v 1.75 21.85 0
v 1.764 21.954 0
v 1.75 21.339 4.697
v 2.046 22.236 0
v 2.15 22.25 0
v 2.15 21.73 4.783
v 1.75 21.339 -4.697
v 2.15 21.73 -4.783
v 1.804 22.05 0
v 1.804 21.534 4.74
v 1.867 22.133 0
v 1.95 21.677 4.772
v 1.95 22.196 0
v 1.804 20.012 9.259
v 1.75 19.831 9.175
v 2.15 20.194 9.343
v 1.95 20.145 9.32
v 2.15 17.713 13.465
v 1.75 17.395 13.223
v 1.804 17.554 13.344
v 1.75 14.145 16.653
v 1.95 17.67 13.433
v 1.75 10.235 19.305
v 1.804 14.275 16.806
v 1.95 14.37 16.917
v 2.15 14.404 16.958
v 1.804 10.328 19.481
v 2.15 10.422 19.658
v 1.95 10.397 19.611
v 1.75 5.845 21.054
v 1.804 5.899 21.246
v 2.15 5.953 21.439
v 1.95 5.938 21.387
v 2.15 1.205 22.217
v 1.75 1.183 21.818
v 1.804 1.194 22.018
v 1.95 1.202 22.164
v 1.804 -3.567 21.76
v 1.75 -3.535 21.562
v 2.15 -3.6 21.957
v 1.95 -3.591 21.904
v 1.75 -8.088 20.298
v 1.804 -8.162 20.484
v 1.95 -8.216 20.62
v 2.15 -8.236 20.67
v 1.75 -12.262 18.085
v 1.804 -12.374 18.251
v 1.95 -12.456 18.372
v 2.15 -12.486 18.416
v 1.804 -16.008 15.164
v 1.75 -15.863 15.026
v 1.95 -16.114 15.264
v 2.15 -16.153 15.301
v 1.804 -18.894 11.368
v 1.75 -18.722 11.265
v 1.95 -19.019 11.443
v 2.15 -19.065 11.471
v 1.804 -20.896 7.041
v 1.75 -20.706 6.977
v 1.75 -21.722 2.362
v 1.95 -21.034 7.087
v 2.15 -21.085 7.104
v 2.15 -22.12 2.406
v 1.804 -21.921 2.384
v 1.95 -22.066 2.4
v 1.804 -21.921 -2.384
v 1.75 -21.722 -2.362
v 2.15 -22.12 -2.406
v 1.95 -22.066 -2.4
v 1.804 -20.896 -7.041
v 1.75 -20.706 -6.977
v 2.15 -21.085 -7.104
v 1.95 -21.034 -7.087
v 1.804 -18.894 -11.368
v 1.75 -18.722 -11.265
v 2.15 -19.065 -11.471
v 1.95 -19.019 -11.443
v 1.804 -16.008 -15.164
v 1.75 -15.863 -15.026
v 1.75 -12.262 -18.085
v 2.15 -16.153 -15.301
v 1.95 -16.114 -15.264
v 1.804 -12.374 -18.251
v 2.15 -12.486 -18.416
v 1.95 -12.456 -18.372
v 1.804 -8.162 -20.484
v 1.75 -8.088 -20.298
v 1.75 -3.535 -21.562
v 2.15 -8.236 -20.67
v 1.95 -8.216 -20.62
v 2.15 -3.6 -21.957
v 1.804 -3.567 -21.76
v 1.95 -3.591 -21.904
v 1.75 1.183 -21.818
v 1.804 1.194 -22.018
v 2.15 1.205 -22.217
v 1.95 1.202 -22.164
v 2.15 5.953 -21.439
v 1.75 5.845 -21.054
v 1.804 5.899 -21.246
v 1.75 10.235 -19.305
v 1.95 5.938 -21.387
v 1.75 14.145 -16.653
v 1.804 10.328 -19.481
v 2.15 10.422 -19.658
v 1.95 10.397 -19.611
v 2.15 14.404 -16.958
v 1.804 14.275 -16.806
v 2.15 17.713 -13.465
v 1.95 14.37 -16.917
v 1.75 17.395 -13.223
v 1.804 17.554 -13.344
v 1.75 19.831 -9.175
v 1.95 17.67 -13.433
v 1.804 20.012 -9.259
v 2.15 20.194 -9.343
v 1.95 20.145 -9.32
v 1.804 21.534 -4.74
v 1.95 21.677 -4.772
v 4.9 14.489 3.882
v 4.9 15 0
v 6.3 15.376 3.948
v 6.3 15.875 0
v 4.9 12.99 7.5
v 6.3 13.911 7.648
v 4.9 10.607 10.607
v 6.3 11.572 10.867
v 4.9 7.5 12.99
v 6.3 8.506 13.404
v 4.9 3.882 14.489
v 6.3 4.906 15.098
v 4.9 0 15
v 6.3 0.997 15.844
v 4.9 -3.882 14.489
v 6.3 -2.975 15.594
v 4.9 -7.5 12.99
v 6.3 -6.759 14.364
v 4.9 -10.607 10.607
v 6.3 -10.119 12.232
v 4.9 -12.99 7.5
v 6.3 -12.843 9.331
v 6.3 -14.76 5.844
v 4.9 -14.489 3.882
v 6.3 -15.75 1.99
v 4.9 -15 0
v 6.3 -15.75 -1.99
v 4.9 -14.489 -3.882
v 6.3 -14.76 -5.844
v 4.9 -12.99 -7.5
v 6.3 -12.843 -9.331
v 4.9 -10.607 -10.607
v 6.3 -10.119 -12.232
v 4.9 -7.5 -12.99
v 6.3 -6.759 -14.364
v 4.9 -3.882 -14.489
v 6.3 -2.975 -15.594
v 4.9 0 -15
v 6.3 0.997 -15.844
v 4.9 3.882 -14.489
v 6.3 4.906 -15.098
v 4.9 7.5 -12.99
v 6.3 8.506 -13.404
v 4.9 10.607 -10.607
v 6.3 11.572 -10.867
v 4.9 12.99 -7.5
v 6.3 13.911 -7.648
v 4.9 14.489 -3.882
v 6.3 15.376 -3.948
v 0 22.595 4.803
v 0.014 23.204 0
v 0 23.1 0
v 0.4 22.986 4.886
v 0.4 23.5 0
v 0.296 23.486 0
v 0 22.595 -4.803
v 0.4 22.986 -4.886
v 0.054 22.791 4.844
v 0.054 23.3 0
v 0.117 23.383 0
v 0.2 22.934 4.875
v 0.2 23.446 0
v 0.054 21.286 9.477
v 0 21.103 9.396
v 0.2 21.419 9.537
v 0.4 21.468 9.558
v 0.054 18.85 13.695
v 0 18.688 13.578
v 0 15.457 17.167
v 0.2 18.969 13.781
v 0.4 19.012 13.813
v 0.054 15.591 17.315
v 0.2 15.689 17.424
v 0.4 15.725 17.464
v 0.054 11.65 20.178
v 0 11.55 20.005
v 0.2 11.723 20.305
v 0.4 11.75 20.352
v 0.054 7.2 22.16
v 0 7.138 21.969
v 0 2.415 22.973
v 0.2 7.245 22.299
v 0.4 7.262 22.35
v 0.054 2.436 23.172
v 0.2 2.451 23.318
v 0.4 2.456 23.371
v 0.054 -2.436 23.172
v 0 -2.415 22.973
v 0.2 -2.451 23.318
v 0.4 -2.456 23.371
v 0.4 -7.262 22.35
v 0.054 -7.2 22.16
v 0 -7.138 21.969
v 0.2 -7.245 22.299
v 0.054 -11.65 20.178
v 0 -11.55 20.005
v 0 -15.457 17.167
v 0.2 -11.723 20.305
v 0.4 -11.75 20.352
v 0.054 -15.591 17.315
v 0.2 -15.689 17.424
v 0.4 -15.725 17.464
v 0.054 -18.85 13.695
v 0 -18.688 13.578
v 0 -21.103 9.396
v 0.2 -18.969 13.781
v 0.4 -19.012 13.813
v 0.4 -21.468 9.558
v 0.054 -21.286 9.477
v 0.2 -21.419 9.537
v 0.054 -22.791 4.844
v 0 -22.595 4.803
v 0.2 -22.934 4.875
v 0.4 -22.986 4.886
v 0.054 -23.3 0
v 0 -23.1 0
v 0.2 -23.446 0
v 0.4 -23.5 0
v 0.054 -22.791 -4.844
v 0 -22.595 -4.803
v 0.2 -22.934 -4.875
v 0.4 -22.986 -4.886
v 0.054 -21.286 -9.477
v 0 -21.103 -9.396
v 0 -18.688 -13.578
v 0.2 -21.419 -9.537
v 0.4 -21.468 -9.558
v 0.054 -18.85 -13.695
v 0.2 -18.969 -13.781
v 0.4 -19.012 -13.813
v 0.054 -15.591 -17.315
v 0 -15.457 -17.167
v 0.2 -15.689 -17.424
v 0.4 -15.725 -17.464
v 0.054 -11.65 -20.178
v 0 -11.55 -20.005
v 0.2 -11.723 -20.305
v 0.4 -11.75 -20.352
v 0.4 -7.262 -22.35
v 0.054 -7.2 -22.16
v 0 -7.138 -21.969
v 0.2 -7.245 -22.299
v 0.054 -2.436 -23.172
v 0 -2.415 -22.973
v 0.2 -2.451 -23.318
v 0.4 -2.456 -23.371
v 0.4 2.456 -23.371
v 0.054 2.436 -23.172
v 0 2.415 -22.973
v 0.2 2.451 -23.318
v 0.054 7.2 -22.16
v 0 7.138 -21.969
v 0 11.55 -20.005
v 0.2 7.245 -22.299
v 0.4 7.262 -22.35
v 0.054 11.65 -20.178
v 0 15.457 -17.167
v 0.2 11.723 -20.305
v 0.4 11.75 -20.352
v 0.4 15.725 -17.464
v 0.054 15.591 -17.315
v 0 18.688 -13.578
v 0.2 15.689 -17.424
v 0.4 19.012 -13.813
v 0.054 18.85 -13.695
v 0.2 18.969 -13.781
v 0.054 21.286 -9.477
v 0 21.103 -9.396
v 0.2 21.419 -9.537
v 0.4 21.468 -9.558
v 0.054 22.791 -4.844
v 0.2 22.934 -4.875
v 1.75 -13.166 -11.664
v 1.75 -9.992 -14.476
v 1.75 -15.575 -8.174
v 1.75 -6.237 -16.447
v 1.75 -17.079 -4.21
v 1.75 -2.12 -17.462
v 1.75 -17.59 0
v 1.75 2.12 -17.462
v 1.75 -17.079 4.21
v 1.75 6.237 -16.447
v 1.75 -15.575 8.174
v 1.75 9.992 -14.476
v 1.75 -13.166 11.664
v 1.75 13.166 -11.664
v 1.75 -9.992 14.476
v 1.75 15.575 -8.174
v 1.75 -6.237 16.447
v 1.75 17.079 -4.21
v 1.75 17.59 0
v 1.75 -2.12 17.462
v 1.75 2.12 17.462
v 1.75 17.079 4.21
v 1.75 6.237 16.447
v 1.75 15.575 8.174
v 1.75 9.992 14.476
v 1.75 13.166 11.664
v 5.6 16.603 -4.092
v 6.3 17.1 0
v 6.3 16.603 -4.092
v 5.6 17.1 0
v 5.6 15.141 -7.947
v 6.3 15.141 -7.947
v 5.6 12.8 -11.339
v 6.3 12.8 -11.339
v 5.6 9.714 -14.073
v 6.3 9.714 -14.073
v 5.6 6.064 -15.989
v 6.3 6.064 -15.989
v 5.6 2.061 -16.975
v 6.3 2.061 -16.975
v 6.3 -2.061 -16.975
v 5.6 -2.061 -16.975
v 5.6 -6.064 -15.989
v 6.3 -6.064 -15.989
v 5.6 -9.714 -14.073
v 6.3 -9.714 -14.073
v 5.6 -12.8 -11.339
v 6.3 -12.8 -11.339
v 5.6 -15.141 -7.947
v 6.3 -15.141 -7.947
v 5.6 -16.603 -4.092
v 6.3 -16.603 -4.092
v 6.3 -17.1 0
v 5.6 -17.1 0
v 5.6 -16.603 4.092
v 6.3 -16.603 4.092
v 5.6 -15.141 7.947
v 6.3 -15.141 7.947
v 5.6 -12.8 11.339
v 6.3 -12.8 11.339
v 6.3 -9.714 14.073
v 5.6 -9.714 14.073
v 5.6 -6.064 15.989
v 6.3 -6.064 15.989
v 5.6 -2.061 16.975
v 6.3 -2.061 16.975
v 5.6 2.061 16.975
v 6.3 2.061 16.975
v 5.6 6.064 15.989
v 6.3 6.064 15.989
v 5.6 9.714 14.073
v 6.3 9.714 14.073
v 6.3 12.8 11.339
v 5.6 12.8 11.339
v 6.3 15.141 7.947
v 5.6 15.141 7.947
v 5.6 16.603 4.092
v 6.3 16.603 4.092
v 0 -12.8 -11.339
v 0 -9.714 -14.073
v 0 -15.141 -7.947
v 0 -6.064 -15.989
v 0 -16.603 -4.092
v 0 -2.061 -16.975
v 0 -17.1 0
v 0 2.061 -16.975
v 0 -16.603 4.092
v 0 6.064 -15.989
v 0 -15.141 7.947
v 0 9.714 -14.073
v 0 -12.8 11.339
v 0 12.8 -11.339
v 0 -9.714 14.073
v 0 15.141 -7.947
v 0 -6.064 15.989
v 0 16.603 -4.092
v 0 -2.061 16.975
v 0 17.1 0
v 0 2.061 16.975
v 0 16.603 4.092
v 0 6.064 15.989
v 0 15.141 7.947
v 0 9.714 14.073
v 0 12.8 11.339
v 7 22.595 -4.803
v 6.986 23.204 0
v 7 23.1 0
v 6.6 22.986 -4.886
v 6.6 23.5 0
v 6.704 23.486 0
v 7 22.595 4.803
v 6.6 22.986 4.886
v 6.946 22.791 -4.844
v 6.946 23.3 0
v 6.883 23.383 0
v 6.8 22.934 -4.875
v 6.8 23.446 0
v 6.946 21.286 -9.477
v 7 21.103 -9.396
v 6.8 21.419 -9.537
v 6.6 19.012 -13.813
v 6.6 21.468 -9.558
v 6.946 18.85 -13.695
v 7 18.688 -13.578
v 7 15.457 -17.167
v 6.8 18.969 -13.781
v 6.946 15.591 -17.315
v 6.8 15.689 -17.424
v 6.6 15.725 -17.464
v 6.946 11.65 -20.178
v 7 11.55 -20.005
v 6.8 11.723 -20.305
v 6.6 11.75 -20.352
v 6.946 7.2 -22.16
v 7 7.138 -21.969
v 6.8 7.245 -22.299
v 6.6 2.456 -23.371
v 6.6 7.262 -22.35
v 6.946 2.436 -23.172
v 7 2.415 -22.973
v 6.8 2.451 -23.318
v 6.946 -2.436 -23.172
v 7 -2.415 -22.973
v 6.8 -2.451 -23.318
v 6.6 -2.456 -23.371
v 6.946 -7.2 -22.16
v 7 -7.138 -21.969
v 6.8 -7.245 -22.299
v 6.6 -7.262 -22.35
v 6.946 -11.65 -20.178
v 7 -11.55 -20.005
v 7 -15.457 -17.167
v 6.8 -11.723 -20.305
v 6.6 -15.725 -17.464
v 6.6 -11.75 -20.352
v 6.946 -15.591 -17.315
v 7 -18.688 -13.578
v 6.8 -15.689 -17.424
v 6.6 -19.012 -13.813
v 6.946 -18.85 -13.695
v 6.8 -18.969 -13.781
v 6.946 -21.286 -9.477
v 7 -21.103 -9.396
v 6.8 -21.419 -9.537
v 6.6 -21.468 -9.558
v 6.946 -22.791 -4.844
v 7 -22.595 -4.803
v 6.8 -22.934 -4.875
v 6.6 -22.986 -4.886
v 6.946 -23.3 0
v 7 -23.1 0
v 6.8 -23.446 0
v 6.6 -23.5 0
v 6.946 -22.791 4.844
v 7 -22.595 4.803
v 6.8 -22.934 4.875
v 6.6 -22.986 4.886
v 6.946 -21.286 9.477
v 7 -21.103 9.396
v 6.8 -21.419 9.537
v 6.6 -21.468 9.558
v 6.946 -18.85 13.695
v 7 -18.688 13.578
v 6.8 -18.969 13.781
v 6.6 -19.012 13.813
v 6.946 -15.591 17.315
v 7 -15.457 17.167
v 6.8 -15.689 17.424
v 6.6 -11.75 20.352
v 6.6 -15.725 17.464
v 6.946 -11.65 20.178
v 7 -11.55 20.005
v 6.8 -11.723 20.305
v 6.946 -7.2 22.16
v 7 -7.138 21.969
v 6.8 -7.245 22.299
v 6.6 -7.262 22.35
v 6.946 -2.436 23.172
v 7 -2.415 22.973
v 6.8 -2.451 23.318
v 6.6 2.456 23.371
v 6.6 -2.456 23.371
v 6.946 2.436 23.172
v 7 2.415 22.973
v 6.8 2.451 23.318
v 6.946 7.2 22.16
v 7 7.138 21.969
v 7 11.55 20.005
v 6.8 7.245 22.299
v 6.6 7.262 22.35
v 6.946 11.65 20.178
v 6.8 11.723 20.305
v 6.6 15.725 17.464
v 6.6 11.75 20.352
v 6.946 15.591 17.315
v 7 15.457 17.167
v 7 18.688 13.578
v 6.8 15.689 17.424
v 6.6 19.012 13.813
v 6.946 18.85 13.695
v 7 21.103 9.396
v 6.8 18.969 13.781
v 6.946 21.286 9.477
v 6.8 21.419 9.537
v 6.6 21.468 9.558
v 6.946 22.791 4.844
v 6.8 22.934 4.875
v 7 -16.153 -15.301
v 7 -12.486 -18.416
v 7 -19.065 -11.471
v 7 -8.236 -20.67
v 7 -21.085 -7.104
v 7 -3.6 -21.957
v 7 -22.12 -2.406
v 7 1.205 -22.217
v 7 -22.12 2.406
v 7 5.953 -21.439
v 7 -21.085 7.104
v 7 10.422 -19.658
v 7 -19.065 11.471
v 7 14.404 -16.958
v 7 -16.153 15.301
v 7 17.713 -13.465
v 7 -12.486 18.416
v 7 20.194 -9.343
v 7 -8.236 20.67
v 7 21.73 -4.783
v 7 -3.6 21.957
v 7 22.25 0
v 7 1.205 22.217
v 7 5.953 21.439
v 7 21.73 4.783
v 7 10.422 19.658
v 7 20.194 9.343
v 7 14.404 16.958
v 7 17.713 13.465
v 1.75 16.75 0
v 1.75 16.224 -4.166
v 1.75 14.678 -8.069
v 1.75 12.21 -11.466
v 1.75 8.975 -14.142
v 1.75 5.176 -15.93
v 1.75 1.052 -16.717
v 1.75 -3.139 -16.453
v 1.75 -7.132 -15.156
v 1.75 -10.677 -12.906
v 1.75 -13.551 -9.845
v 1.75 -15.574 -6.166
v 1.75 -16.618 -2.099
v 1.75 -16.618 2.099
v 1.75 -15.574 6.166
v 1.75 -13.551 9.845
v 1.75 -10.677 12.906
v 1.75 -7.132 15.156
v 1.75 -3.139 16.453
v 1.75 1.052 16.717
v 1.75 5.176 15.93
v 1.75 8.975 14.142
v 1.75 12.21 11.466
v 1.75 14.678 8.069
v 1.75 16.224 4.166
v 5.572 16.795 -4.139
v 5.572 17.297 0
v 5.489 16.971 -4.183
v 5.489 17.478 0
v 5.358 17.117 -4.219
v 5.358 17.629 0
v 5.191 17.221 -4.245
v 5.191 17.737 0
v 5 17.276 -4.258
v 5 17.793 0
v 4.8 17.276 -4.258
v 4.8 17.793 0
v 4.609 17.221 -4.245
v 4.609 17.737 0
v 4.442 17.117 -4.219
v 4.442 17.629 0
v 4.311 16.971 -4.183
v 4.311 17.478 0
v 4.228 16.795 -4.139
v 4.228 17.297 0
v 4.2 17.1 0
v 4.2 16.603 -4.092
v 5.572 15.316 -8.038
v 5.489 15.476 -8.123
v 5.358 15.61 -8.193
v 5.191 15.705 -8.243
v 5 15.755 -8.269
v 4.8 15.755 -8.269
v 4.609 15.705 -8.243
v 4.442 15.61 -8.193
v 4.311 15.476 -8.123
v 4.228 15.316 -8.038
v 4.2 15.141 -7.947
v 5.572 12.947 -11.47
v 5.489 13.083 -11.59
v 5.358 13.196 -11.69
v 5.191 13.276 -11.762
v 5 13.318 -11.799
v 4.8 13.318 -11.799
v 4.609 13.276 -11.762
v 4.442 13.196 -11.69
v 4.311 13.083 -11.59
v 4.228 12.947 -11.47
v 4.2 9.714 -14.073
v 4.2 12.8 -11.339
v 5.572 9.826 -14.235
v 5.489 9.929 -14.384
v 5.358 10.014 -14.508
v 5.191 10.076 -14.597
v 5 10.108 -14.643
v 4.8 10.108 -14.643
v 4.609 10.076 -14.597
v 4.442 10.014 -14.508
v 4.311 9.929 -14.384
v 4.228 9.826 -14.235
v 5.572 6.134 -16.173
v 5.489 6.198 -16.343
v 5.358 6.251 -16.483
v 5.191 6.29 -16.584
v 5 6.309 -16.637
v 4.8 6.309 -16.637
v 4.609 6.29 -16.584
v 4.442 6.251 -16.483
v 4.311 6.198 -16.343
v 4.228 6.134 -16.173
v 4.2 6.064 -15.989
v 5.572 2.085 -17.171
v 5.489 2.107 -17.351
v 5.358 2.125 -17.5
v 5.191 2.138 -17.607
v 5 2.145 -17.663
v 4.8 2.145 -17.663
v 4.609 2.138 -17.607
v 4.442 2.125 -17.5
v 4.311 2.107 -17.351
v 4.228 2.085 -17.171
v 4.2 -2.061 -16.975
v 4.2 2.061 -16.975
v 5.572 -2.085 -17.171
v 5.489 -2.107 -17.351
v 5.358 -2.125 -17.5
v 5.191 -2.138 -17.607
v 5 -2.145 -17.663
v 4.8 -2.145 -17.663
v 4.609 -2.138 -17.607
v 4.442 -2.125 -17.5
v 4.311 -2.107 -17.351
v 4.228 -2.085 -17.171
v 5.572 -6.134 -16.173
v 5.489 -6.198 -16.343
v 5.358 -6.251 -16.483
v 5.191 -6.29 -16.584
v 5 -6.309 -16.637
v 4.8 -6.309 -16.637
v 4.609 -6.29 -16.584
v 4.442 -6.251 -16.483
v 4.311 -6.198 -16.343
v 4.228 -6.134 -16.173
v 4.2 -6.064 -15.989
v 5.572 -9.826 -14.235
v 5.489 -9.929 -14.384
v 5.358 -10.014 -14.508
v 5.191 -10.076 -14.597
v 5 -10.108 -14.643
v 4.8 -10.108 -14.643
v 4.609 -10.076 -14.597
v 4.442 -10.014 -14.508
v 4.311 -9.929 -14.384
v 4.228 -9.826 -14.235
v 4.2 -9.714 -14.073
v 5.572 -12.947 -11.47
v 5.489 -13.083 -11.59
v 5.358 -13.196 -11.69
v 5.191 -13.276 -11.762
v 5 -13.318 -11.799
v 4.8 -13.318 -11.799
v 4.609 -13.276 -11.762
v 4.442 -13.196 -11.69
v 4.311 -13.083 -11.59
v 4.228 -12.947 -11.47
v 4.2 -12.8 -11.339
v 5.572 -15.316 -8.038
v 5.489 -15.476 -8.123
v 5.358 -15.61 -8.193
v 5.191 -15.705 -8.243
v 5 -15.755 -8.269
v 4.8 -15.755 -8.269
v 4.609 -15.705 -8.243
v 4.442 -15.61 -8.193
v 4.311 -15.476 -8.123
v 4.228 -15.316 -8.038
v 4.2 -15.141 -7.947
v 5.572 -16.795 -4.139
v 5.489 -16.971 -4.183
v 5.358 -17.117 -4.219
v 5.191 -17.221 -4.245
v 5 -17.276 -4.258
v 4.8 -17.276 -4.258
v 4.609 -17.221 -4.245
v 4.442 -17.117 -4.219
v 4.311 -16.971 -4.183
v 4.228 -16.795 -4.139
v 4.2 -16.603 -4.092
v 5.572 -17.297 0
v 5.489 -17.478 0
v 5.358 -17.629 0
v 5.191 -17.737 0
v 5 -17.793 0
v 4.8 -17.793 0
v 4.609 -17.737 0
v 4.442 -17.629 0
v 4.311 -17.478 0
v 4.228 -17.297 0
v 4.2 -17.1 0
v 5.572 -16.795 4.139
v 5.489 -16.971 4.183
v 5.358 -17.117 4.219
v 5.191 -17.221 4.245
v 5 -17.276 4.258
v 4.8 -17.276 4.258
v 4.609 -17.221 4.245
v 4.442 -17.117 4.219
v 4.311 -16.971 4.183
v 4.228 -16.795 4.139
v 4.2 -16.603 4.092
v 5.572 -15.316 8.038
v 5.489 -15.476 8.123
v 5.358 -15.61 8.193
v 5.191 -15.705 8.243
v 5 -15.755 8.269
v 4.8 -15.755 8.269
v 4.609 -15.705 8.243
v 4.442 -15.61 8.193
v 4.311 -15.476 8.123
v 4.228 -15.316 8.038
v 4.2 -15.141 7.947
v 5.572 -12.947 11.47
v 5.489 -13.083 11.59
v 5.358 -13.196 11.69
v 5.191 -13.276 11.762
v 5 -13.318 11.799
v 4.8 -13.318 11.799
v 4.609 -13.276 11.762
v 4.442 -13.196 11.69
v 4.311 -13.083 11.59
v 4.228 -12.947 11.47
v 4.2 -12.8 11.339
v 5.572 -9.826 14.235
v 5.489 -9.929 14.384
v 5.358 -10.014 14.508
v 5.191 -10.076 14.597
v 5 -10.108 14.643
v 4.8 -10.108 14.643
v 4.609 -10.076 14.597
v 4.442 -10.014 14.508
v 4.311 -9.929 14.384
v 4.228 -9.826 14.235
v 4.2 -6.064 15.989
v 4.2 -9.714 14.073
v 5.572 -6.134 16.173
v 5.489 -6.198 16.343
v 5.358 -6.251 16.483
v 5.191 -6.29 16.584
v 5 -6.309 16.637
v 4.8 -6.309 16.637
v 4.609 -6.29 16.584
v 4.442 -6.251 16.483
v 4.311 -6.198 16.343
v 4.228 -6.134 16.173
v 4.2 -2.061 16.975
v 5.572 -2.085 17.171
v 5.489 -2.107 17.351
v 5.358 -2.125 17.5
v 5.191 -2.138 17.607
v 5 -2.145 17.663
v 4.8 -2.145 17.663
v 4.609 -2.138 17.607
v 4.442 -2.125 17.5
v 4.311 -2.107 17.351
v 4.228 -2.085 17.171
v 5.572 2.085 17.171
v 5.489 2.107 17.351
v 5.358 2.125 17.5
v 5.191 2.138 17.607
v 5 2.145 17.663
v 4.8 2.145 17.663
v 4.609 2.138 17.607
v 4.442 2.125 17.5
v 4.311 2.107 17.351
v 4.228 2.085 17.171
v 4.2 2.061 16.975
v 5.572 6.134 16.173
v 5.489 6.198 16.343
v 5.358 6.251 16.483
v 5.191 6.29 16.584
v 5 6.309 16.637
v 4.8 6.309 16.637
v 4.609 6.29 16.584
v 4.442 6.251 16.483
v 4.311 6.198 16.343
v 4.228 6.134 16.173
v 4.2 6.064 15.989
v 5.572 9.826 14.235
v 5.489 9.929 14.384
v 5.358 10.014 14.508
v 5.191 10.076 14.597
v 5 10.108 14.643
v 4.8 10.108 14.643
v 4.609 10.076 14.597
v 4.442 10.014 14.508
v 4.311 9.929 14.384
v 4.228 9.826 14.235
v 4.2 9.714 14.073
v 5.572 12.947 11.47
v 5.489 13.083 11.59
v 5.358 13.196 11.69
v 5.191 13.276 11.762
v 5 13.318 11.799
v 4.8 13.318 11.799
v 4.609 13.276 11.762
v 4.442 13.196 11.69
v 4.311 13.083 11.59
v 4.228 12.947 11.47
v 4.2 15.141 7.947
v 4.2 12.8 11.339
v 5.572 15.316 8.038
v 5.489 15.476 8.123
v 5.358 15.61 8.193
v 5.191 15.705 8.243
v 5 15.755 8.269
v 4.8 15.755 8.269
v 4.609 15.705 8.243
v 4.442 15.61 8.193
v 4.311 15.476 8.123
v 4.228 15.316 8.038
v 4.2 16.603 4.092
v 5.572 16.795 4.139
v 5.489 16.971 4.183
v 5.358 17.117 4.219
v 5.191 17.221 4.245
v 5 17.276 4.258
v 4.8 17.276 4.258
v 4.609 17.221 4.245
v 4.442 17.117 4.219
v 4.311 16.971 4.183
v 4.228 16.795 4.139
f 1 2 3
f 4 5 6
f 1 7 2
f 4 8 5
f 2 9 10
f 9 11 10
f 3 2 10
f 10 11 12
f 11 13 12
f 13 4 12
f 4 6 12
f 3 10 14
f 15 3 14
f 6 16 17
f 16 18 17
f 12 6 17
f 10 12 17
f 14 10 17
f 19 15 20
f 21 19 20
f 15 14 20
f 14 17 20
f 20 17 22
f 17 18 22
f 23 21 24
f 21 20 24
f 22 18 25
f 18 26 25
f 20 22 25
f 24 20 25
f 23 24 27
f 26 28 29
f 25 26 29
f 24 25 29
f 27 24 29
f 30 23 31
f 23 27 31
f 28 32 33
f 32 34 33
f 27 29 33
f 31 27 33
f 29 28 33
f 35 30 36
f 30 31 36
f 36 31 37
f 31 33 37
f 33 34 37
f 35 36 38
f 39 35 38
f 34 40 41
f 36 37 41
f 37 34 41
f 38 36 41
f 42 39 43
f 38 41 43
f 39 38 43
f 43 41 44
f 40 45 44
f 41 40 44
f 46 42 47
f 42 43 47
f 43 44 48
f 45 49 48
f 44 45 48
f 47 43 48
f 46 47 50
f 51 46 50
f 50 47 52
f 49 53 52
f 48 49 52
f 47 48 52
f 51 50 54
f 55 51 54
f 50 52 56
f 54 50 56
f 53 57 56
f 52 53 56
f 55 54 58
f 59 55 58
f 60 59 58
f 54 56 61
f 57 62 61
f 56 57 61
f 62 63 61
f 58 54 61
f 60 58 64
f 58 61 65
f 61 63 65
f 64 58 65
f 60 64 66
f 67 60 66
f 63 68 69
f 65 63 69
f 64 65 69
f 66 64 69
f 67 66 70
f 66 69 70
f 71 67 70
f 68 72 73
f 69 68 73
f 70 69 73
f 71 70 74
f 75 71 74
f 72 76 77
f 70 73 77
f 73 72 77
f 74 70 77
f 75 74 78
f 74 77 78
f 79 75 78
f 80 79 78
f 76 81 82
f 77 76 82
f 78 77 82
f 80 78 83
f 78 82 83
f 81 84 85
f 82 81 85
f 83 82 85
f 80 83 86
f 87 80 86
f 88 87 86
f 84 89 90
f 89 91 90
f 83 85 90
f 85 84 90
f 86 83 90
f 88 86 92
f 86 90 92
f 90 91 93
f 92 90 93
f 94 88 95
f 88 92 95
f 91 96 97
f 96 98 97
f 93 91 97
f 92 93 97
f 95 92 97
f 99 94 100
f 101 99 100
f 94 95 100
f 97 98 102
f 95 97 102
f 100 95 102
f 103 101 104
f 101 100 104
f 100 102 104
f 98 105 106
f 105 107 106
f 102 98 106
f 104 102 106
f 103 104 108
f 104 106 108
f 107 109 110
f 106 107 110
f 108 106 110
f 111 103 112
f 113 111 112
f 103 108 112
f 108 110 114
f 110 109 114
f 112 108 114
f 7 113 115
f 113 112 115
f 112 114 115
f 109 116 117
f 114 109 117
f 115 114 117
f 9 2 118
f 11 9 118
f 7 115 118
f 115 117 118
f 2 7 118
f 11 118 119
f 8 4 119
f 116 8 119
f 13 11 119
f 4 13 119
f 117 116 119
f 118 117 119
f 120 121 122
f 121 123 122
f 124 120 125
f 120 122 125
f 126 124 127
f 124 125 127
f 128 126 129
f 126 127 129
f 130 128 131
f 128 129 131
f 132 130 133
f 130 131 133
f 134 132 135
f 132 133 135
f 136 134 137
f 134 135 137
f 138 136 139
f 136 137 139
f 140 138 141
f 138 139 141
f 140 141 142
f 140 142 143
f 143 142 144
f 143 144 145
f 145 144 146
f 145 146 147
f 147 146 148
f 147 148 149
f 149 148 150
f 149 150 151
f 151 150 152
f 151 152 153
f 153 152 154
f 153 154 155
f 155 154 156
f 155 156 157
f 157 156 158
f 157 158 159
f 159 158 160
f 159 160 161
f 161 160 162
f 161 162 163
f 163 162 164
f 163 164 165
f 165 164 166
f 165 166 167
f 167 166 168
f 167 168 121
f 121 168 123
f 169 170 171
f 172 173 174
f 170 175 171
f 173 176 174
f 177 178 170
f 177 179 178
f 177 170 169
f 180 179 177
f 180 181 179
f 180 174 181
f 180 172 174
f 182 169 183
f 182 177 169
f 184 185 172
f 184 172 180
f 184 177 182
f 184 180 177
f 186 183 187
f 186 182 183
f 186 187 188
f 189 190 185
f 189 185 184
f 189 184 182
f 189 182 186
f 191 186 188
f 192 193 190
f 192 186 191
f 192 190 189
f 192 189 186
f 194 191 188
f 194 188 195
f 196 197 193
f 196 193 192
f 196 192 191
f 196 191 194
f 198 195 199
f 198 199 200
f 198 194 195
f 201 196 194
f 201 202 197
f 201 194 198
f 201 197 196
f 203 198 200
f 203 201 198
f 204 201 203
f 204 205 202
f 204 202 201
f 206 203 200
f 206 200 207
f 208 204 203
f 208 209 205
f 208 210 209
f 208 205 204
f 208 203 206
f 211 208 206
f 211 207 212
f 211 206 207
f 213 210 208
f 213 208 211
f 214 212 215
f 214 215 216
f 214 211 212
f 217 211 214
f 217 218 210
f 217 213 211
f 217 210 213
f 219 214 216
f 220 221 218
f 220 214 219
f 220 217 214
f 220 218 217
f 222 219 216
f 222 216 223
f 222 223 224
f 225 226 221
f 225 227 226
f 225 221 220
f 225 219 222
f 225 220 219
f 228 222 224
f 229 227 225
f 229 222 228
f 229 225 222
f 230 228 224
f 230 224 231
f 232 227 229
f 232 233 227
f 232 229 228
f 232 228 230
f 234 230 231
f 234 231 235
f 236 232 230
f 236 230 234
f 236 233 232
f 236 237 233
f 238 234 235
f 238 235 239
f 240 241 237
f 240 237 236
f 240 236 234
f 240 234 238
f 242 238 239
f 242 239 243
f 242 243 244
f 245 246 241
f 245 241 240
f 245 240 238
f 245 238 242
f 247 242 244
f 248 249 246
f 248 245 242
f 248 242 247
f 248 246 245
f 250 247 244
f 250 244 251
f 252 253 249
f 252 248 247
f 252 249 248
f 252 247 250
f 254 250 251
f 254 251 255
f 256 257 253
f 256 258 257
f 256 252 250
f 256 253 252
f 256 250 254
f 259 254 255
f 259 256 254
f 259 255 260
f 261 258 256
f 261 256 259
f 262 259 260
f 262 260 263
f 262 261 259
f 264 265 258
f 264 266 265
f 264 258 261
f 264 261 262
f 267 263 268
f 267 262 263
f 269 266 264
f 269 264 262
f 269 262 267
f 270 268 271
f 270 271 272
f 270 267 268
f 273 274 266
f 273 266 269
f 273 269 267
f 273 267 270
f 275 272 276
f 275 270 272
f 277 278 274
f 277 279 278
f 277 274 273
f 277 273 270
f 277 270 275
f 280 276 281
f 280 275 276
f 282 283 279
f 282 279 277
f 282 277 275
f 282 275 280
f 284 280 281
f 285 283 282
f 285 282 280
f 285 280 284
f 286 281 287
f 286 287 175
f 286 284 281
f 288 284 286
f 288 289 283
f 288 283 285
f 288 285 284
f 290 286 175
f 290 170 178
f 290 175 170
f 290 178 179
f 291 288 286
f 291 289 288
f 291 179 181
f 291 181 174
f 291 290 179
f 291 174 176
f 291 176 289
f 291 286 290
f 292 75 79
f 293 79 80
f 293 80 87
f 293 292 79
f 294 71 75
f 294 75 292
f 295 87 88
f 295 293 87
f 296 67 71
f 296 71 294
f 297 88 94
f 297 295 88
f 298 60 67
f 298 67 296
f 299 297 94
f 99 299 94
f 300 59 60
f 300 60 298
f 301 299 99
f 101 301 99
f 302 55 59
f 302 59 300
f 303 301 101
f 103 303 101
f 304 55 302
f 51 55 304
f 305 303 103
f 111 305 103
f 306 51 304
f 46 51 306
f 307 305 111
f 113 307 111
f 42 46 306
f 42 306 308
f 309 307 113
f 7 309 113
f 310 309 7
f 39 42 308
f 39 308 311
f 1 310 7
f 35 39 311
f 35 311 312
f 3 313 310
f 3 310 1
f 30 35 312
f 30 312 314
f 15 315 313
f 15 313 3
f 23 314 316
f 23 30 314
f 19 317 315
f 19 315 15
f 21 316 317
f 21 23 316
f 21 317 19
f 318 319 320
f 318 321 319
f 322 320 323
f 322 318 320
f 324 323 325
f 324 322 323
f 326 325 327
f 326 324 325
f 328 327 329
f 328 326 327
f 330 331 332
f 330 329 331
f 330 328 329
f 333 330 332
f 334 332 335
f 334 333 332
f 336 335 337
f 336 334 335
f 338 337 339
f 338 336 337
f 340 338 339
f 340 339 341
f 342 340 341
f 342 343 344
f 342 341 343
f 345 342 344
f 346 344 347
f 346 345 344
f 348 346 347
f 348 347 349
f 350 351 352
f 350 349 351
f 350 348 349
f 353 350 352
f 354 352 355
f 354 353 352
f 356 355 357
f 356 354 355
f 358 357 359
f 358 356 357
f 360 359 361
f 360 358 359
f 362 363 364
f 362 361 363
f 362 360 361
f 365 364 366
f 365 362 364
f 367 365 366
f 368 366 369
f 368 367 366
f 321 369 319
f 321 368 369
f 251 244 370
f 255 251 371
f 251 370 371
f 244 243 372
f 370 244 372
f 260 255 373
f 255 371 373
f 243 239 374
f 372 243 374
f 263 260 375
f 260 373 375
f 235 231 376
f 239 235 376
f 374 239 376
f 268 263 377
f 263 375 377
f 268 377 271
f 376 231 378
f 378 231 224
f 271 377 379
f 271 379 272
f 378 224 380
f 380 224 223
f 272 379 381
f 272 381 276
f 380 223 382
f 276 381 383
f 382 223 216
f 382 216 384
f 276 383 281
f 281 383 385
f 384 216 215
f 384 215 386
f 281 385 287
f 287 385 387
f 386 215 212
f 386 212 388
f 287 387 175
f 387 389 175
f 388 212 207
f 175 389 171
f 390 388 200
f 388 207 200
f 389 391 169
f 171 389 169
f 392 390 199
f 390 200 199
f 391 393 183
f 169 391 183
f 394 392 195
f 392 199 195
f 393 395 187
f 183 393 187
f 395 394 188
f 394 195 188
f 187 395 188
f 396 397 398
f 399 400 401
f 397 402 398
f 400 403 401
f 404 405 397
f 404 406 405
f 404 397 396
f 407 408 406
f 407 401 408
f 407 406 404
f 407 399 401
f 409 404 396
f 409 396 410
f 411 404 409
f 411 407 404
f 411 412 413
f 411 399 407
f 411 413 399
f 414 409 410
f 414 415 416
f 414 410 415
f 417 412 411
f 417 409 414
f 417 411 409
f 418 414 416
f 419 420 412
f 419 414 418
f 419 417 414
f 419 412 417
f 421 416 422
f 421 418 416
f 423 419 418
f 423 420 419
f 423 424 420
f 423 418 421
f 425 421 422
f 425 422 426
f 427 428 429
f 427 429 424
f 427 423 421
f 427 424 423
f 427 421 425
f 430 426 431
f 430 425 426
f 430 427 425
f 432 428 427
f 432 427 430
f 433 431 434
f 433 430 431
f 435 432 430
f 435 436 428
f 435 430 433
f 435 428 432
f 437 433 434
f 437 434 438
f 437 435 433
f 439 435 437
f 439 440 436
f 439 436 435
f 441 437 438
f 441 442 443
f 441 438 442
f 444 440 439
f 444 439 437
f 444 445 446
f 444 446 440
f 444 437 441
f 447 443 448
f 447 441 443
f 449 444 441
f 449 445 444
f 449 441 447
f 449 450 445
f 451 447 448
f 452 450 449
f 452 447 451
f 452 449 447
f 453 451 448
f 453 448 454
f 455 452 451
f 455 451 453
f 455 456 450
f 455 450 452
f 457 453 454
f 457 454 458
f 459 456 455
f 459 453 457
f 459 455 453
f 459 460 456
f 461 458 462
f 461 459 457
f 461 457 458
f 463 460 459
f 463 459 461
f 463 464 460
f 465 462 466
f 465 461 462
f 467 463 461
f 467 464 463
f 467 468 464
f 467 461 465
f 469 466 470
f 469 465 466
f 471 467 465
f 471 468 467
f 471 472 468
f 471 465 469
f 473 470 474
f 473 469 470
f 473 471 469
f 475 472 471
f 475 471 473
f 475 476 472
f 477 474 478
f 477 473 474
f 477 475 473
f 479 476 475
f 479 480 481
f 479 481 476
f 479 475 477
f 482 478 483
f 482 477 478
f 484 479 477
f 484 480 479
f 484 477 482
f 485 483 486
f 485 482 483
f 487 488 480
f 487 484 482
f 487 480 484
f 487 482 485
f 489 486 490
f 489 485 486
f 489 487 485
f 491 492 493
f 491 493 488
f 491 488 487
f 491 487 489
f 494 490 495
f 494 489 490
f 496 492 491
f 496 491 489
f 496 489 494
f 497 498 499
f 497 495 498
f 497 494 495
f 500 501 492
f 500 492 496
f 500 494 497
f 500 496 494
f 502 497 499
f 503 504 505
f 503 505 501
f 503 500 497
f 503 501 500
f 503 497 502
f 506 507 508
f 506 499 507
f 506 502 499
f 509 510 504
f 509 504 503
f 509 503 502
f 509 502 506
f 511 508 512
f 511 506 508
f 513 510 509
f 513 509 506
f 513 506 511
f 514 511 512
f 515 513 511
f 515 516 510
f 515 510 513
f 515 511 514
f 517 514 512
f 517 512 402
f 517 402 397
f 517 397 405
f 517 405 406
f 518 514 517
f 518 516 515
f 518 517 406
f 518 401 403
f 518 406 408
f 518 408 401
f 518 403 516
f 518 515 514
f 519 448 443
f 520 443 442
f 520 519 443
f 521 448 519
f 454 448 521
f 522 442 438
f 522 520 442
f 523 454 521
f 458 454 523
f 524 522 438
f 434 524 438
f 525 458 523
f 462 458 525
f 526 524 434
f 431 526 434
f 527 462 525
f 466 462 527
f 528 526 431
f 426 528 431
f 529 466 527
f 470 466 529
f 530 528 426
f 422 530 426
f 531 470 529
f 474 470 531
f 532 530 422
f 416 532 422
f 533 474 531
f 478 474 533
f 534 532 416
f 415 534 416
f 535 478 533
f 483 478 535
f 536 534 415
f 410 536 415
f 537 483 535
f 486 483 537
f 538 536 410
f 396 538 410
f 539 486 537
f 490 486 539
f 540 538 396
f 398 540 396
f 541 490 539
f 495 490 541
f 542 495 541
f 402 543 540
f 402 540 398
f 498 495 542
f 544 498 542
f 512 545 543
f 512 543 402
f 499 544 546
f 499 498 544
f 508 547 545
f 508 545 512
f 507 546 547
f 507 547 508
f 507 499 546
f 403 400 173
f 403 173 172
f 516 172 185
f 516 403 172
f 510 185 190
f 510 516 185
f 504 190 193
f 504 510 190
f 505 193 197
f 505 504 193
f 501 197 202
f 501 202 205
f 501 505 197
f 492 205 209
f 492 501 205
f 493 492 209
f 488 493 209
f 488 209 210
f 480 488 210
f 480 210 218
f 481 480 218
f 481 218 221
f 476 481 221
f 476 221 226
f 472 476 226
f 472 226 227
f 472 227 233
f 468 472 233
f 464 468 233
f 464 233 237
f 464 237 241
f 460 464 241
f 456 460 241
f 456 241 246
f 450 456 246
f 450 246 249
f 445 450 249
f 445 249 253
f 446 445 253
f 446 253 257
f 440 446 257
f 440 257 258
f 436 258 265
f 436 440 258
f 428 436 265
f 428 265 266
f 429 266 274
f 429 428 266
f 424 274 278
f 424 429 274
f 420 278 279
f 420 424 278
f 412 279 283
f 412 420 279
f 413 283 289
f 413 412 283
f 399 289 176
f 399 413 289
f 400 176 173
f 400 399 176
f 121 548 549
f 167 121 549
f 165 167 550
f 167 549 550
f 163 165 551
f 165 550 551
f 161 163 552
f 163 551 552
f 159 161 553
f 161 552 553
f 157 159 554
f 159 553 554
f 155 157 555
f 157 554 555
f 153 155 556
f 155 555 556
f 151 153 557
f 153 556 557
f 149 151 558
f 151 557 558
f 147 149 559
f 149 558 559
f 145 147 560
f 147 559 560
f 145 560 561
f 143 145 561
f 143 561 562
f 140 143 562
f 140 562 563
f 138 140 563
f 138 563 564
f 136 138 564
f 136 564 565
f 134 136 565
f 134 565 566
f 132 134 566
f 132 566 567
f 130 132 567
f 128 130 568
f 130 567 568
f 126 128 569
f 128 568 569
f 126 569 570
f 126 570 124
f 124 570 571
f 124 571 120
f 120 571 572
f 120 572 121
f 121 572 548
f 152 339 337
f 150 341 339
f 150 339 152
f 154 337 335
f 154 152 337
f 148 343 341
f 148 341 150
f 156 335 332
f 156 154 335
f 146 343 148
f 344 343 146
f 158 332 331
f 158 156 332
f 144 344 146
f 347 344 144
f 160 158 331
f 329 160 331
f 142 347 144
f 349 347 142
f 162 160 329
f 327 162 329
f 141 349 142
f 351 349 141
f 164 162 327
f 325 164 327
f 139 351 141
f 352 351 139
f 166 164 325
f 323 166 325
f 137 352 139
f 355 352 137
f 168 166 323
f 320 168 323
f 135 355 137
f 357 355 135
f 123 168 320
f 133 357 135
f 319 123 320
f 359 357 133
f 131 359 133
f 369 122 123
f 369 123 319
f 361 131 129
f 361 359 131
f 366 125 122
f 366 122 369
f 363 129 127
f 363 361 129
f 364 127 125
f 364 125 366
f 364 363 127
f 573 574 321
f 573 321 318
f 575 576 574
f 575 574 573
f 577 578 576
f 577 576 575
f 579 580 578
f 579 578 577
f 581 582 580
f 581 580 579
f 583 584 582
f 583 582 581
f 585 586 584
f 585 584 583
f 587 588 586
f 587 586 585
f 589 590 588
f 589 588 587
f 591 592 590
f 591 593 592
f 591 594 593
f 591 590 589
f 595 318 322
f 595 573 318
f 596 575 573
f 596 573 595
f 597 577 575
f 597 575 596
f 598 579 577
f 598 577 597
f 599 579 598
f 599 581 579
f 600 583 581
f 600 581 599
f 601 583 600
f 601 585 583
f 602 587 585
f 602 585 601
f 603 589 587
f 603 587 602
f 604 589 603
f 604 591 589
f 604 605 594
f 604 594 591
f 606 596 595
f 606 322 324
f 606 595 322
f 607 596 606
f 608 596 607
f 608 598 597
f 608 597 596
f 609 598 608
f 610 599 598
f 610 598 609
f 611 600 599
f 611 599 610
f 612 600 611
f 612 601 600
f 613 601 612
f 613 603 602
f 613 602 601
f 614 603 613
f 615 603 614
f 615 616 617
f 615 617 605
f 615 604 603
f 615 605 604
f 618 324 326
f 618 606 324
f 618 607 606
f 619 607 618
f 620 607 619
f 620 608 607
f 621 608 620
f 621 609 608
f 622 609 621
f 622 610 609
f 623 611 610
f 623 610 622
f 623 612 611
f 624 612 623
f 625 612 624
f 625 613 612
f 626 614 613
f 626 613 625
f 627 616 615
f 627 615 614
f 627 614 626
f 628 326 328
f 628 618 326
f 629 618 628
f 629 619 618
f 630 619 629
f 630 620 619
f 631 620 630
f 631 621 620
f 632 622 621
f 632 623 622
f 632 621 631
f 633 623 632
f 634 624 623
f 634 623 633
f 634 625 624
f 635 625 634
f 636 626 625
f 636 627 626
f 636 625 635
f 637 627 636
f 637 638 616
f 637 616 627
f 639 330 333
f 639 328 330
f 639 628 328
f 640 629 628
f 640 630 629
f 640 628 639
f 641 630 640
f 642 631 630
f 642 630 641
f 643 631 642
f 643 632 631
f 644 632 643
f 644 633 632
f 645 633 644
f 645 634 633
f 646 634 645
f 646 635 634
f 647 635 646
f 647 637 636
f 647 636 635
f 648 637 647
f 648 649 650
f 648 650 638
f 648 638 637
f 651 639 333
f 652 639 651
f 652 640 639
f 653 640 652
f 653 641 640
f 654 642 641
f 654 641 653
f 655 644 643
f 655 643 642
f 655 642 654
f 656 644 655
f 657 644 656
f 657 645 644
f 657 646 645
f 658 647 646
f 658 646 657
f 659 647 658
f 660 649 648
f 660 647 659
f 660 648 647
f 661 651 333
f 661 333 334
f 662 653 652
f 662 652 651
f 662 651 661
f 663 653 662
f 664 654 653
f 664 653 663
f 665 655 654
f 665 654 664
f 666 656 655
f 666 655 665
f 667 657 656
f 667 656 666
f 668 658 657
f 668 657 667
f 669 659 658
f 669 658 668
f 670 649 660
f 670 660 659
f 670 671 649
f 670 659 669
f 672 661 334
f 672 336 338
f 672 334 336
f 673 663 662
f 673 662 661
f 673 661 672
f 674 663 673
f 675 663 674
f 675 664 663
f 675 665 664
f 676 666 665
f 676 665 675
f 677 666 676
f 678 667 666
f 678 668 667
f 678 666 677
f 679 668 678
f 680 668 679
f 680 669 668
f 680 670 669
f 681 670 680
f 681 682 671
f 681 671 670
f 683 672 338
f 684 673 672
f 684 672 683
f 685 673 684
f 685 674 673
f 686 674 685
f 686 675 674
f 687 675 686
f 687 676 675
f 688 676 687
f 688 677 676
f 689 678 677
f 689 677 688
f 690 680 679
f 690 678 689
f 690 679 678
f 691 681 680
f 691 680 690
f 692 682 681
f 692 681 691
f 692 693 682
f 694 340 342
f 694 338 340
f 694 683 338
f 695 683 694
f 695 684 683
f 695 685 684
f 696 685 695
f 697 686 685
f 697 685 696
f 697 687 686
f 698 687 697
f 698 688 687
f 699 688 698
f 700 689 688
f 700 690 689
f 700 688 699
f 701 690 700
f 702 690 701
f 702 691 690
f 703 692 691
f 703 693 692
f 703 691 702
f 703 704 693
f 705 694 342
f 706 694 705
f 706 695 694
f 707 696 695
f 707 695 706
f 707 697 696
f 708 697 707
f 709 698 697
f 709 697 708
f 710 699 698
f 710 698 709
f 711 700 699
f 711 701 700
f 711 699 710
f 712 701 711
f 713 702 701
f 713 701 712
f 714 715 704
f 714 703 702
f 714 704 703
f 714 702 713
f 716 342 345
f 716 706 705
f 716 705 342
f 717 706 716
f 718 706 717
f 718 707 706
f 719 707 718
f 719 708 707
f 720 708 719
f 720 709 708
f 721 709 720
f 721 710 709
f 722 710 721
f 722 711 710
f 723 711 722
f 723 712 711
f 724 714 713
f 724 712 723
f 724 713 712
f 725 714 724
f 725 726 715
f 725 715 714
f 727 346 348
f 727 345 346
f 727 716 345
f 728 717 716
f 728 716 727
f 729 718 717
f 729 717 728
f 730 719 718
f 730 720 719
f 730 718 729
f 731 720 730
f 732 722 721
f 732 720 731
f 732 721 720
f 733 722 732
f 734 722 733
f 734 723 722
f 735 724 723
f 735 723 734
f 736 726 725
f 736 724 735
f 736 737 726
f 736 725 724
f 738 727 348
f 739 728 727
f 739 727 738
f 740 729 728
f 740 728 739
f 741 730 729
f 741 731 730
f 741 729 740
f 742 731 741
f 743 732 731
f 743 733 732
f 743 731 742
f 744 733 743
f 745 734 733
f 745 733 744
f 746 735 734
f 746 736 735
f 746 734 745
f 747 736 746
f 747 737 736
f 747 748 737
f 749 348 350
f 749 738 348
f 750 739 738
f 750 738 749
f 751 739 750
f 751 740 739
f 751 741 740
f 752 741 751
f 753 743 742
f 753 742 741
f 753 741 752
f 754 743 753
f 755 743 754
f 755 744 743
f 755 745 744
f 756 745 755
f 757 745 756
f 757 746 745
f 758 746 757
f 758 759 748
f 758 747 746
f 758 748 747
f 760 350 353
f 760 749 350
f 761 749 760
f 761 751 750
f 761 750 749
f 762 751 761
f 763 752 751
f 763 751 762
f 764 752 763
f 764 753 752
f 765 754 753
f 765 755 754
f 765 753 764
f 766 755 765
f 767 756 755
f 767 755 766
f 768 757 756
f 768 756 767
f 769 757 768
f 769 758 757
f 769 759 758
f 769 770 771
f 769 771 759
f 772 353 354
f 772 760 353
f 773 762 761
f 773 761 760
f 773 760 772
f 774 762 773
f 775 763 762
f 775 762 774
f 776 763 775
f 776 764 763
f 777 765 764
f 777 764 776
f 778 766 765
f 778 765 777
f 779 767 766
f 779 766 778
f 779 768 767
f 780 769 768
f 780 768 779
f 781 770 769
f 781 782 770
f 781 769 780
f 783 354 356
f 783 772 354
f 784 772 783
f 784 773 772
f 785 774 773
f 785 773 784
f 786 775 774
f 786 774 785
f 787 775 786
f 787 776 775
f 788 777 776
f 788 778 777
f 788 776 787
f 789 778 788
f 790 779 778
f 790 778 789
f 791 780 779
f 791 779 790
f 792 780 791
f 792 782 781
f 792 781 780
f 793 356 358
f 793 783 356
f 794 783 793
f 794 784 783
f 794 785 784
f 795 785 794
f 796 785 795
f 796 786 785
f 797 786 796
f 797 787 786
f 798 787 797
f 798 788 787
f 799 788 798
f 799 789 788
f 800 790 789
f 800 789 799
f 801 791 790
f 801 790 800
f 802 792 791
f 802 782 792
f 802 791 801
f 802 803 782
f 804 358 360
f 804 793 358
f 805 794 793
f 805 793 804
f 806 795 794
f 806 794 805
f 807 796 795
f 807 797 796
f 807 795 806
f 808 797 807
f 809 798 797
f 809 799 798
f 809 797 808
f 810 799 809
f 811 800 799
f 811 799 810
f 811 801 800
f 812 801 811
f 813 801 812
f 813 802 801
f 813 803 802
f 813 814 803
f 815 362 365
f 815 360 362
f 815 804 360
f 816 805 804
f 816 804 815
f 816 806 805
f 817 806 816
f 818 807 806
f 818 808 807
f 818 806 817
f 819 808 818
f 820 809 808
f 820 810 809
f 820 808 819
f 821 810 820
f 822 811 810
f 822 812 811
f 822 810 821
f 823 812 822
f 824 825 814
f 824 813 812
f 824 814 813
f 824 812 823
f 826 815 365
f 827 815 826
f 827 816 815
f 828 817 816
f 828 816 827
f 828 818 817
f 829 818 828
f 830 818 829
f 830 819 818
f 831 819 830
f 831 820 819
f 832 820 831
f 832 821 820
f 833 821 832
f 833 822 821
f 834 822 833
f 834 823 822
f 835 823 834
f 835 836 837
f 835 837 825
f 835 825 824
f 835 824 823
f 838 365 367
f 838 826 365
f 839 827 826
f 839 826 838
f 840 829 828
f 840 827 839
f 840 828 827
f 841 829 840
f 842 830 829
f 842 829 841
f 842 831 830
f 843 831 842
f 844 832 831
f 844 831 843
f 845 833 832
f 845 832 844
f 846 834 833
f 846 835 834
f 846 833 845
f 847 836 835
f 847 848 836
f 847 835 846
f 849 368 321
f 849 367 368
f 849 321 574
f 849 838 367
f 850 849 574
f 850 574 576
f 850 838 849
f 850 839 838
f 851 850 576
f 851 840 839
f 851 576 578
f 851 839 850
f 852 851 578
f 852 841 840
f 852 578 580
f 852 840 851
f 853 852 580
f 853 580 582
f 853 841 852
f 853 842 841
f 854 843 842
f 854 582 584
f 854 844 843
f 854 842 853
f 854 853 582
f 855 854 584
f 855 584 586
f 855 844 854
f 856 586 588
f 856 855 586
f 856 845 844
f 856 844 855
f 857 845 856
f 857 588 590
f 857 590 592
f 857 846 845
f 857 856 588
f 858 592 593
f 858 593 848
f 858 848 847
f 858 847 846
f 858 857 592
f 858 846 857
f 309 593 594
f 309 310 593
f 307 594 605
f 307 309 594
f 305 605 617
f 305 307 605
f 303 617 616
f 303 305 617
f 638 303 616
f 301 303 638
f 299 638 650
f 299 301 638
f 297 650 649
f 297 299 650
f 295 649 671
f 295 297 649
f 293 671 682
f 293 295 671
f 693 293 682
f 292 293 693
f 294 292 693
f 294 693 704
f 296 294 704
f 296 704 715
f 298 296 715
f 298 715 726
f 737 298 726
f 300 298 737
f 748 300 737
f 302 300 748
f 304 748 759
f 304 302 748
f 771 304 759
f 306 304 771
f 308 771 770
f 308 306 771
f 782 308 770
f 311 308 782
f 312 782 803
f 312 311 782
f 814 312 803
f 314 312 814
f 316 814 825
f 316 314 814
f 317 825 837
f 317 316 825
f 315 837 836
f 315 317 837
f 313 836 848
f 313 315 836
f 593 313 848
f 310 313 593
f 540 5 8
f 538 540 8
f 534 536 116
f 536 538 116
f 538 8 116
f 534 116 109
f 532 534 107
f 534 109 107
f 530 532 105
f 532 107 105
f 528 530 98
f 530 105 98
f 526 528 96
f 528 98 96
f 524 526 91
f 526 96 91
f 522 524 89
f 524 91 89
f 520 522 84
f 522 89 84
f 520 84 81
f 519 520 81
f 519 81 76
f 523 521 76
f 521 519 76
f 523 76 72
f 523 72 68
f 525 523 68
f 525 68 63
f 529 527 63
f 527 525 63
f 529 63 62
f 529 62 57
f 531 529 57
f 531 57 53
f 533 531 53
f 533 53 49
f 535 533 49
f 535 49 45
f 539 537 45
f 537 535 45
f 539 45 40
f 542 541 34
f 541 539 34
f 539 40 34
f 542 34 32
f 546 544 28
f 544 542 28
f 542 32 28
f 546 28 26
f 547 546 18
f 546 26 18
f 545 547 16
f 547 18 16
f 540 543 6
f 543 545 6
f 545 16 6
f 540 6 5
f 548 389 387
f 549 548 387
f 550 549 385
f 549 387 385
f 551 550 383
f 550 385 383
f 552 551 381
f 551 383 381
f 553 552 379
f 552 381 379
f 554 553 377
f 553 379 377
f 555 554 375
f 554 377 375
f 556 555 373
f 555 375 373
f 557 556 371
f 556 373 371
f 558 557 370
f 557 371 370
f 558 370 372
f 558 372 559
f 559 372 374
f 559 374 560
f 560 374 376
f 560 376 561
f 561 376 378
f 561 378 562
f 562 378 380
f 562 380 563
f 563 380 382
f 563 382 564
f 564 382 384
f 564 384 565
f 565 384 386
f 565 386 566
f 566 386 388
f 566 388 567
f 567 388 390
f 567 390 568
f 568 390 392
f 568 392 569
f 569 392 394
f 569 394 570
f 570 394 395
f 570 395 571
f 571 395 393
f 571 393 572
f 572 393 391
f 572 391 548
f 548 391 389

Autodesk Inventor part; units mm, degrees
ref_plane "YZ Plane" through (0, 0, 0) normal (1, 0, 0) x (0, 1, 0)
ref_plane "XZ Plane" through (0, 0, 0) normal (0, 1, 0) x (-1, 0, 0)
ref_plane "XY Plane" through (0, 0, 0) normal (0, 0, 1) x (1, 0, 0)
sketch "Эскиз1" plane through (0, 0, 0) normal (0, 0, 1) x (1, 0, 0)
  circle A0 centre (4.9, 17.1) radius 0.455
  circle A1 centre (4.9, 17.1) radius 0.7
  line L0 (6.3, 15.875) -> (6.3, 17.1)
  line L1 (0, 23.5) -> (7, 23.5)
  line L2 (7, 23.5) -> (7, 22.25)
  line L3 (7, 22.25) -> (1.75, 22.25)
  line L4 (0, 0) -> (9.5856, 0)
  line L5 (0, 23.5) -> (0, 17.1)
  line L6 (0, 17.1) -> (1.75, 16.75)
  line L7 (1.75, 16.75) -> (4.9, 15)
  line L8 (4.9, 15) -> (6.3, 15.875)
  line L9 (4.9, 15) -> (0, 15) construction
  line L10 (0, 18) -> (0, -3) projected
  line L11 (-1.9171, 0) -> (11.5027, 0) projected
  line L12 (4.2, 17.1) -> (1.75, 17.59)
  line L13 (1.75, 17.59) -> (1.75, 22.25)
  line L14 (6.3, 17.1) -> (5.6, 17.1)
  dimension "d0" = 47
  dimension "d1" = 31.75
  dimension "d2" = 1.25
  dimension "d3" = 0.91
  dimension "d4" = 1.4
  dimension "d5" = 30
  dimension "d6" = 33.5
  dimension "d7" = 34.2
  dimension "d8" = 4.9
  dimension "d9" = 6.3
  dimension "d10" = 7
  dimension "d12" = 1.75
revolve "Базовый элемент" add sketch "Эскиз1" angle 360 about axis through (0, 0, 0) along (1, 0, 0) contours L14 L0 L8 L7 L6 L5 L1 L2 L3 L13 L12 A1
revolve "Пружинные1" add sketch "Эскиз1" angle 360 about axis through (0, 0, 0) along (1, 0, 0) contours A0 | A1
fillet "Сопряжение1" radius 0.4 3 edges at (7, -23.5, 0) (1.75, -22.25, 0) (0, -23.5, 0)
equation "\"d0\" = SD2"
equation "\"d1\" = ABDM"
equation "\"d3\" = SPDI"
equation "\"d4\" = SPDA"
equation "\"d5\" = NND"
equation "\"d6\" = TKDM"
equation "\"d7\" = HLDM"
equation "\"d8\" = SPDST"
equation "\"d9\" = SDI"
equation "\"d10\" = SWDT"
equation "\"d12\" = SD"
equation "\"d11\" = RR"
equation "\"SD2\" = 47"
equation "\"SWDT\" = 7"
equation "\"RR\" = 0.4"
equation "\"SD\" = 1.75"
equation "\"NND\" = 30"
equation "\"SPDA\" = 1.4"
equation "\"SPDI\" = 0.91"
equation "\"TKDM\" = 33.5"
equation "\"HLDM\" = 34.2"
equation "\"ABDM\" = 31.75"
equation "\"SDI\" = 6.3"
equation "\"SPDST\" = 4.9"
equation "\"LAB\" = 0.35"
properties part number "Манжет 1-30x47x7 ГОСТ 8752-79" material "Резина"
